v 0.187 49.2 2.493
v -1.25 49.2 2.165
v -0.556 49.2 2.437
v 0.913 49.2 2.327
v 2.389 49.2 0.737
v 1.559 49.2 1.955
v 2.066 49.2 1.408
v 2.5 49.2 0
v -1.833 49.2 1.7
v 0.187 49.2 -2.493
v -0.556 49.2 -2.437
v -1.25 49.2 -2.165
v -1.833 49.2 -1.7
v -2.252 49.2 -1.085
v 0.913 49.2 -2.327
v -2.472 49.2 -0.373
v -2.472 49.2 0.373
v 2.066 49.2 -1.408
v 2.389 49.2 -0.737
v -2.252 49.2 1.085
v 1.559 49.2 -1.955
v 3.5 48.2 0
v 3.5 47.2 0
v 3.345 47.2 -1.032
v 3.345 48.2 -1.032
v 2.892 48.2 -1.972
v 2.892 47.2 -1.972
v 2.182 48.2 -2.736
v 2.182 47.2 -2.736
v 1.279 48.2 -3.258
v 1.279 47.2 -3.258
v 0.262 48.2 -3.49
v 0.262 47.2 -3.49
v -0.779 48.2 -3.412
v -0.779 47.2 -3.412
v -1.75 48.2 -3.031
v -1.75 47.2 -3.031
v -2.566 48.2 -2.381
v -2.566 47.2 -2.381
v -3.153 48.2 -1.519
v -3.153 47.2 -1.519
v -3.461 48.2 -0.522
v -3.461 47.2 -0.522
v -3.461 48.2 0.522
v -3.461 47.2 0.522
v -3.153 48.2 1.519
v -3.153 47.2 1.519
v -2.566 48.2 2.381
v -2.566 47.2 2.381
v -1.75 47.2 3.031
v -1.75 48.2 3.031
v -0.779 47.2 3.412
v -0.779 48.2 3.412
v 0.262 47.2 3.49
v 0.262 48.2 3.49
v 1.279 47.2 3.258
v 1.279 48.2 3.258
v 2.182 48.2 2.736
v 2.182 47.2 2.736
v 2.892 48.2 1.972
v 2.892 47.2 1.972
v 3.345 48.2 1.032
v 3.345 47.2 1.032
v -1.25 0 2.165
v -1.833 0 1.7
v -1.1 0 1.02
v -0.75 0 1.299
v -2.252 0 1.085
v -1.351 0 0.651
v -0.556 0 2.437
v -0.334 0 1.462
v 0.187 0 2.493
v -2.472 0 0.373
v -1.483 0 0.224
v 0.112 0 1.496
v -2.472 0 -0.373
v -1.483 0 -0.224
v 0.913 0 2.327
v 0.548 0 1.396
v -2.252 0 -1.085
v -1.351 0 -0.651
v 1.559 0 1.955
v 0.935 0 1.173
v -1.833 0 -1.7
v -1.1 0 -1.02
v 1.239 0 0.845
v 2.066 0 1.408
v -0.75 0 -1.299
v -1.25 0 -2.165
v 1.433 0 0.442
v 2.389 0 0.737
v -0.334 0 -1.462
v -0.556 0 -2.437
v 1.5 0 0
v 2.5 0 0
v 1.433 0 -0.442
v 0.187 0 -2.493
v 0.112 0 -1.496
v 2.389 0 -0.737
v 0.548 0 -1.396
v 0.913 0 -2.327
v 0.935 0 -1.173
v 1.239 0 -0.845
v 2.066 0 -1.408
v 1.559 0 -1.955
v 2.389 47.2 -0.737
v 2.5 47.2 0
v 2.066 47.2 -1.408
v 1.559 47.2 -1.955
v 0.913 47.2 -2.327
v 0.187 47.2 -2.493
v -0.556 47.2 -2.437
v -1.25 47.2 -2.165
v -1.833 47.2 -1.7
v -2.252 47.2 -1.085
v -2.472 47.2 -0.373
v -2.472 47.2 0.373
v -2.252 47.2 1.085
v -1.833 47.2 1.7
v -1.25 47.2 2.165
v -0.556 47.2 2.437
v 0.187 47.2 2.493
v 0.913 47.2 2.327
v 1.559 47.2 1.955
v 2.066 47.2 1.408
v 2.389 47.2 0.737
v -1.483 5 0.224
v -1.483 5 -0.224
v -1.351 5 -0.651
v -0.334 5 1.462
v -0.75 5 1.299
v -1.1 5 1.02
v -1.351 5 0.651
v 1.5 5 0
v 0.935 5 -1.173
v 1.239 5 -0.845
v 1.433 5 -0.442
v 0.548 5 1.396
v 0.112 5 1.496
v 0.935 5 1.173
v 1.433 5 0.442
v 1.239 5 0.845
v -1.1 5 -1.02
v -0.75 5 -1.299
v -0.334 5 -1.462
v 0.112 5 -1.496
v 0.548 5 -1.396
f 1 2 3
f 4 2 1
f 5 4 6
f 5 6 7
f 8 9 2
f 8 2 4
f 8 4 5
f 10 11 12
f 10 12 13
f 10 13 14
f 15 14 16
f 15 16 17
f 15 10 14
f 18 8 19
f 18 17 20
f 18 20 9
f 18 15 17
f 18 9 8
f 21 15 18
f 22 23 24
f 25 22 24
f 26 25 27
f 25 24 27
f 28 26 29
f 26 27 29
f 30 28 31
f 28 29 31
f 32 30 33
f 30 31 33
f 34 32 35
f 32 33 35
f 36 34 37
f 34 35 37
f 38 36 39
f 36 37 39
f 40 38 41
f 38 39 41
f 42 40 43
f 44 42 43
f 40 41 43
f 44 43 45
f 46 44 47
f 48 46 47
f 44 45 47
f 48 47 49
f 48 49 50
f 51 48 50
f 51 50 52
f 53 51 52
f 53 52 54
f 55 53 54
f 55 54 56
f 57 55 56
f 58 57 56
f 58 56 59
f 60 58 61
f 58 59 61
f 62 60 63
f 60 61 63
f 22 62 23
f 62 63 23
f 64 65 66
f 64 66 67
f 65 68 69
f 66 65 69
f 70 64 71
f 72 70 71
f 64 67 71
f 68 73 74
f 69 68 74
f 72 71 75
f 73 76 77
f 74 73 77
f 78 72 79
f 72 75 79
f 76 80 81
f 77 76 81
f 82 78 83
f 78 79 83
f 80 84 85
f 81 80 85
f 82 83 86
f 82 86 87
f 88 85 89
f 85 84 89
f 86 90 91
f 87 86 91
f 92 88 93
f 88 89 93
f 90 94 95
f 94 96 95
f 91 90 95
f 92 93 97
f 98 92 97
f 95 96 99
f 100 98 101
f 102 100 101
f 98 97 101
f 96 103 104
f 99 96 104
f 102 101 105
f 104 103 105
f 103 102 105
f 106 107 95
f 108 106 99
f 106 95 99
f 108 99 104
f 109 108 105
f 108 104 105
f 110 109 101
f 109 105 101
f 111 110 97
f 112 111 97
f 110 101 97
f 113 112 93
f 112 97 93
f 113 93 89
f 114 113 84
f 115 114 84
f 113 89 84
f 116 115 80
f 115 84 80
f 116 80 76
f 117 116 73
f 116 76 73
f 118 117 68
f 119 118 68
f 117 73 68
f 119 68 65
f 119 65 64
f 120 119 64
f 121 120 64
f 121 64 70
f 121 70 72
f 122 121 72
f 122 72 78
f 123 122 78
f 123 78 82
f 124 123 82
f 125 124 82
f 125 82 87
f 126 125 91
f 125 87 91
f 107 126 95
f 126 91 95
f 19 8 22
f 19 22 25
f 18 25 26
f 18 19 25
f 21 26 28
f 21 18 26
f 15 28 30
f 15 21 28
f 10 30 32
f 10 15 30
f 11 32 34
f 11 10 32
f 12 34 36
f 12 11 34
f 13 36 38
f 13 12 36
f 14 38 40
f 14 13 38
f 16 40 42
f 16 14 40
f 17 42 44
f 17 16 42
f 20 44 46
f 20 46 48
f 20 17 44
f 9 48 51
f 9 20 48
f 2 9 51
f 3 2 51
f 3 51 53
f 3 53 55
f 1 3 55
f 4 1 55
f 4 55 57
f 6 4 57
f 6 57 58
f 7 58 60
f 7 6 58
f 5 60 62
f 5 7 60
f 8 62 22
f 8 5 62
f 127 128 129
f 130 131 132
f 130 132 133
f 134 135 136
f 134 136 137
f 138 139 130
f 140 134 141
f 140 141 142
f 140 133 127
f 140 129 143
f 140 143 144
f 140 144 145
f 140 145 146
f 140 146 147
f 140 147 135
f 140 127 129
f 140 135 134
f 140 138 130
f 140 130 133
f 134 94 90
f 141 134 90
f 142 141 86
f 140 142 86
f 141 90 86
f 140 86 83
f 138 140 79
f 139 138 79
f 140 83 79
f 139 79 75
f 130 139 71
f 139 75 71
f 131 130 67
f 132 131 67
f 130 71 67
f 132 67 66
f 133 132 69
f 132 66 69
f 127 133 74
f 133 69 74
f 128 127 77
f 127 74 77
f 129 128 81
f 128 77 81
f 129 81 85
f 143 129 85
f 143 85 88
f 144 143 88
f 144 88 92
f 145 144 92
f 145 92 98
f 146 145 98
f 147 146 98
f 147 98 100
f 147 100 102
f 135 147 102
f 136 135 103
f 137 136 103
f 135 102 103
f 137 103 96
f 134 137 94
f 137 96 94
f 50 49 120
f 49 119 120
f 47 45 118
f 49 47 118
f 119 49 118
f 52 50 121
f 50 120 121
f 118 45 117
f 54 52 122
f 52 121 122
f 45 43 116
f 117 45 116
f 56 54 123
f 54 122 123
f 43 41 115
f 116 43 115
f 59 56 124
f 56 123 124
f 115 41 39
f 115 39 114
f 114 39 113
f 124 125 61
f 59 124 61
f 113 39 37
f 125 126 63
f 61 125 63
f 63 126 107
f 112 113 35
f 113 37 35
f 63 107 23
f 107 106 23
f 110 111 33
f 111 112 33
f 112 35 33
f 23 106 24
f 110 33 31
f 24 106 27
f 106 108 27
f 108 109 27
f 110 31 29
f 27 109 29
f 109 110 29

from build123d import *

# Parameters (mm, degrees)
SKETCH1_R           = 2.5
BOSS_EXTRUDE1_DEPTH = 47.2
SKETCH2_R           = 3.5
BOSS_EXTRUDE2_DEPTH = 2
CHAMFER1_SIZE       = 1
SKETCH3_R           = 1.5
CUT_EXTRUDE1_DEPTH  = 5


with BuildPart() as part:
    # Sketch1 → Boss-Extrude1 (new body)
    with BuildSketch(Plane(origin=(0, 0, 0), x_dir=(1, 0, 0), z_dir=(0, 1, 0))):
        Circle(SKETCH1_R)
    extrude(amount=BOSS_EXTRUDE1_DEPTH)

    # Sketch2 → Boss-Extrude2 (add)
    with BuildSketch(Plane(origin=(0, 47.2, 0), x_dir=(1, 0, 0), z_dir=(0, 1, 0))):
        Circle(SKETCH2_R)
    extrude(amount=BOSS_EXTRUDE2_DEPTH)

    # Chamfer1
    chamfer1_edges = [part.edges().sort_by_distance(p)[0] for p in [
        (-3.5, 49.2, 0),
    ]]
    chamfer(chamfer1_edges, length=CHAMFER1_SIZE)

    # Sketch3 → Cut-Extrude1 (cut)
    with BuildSketch(Plane.XZ):
        Circle(SKETCH3_R)
    extrude(amount=-CUT_EXTRUDE1_DEPTH, mode=Mode.SUBTRACT)


solid = part.part
